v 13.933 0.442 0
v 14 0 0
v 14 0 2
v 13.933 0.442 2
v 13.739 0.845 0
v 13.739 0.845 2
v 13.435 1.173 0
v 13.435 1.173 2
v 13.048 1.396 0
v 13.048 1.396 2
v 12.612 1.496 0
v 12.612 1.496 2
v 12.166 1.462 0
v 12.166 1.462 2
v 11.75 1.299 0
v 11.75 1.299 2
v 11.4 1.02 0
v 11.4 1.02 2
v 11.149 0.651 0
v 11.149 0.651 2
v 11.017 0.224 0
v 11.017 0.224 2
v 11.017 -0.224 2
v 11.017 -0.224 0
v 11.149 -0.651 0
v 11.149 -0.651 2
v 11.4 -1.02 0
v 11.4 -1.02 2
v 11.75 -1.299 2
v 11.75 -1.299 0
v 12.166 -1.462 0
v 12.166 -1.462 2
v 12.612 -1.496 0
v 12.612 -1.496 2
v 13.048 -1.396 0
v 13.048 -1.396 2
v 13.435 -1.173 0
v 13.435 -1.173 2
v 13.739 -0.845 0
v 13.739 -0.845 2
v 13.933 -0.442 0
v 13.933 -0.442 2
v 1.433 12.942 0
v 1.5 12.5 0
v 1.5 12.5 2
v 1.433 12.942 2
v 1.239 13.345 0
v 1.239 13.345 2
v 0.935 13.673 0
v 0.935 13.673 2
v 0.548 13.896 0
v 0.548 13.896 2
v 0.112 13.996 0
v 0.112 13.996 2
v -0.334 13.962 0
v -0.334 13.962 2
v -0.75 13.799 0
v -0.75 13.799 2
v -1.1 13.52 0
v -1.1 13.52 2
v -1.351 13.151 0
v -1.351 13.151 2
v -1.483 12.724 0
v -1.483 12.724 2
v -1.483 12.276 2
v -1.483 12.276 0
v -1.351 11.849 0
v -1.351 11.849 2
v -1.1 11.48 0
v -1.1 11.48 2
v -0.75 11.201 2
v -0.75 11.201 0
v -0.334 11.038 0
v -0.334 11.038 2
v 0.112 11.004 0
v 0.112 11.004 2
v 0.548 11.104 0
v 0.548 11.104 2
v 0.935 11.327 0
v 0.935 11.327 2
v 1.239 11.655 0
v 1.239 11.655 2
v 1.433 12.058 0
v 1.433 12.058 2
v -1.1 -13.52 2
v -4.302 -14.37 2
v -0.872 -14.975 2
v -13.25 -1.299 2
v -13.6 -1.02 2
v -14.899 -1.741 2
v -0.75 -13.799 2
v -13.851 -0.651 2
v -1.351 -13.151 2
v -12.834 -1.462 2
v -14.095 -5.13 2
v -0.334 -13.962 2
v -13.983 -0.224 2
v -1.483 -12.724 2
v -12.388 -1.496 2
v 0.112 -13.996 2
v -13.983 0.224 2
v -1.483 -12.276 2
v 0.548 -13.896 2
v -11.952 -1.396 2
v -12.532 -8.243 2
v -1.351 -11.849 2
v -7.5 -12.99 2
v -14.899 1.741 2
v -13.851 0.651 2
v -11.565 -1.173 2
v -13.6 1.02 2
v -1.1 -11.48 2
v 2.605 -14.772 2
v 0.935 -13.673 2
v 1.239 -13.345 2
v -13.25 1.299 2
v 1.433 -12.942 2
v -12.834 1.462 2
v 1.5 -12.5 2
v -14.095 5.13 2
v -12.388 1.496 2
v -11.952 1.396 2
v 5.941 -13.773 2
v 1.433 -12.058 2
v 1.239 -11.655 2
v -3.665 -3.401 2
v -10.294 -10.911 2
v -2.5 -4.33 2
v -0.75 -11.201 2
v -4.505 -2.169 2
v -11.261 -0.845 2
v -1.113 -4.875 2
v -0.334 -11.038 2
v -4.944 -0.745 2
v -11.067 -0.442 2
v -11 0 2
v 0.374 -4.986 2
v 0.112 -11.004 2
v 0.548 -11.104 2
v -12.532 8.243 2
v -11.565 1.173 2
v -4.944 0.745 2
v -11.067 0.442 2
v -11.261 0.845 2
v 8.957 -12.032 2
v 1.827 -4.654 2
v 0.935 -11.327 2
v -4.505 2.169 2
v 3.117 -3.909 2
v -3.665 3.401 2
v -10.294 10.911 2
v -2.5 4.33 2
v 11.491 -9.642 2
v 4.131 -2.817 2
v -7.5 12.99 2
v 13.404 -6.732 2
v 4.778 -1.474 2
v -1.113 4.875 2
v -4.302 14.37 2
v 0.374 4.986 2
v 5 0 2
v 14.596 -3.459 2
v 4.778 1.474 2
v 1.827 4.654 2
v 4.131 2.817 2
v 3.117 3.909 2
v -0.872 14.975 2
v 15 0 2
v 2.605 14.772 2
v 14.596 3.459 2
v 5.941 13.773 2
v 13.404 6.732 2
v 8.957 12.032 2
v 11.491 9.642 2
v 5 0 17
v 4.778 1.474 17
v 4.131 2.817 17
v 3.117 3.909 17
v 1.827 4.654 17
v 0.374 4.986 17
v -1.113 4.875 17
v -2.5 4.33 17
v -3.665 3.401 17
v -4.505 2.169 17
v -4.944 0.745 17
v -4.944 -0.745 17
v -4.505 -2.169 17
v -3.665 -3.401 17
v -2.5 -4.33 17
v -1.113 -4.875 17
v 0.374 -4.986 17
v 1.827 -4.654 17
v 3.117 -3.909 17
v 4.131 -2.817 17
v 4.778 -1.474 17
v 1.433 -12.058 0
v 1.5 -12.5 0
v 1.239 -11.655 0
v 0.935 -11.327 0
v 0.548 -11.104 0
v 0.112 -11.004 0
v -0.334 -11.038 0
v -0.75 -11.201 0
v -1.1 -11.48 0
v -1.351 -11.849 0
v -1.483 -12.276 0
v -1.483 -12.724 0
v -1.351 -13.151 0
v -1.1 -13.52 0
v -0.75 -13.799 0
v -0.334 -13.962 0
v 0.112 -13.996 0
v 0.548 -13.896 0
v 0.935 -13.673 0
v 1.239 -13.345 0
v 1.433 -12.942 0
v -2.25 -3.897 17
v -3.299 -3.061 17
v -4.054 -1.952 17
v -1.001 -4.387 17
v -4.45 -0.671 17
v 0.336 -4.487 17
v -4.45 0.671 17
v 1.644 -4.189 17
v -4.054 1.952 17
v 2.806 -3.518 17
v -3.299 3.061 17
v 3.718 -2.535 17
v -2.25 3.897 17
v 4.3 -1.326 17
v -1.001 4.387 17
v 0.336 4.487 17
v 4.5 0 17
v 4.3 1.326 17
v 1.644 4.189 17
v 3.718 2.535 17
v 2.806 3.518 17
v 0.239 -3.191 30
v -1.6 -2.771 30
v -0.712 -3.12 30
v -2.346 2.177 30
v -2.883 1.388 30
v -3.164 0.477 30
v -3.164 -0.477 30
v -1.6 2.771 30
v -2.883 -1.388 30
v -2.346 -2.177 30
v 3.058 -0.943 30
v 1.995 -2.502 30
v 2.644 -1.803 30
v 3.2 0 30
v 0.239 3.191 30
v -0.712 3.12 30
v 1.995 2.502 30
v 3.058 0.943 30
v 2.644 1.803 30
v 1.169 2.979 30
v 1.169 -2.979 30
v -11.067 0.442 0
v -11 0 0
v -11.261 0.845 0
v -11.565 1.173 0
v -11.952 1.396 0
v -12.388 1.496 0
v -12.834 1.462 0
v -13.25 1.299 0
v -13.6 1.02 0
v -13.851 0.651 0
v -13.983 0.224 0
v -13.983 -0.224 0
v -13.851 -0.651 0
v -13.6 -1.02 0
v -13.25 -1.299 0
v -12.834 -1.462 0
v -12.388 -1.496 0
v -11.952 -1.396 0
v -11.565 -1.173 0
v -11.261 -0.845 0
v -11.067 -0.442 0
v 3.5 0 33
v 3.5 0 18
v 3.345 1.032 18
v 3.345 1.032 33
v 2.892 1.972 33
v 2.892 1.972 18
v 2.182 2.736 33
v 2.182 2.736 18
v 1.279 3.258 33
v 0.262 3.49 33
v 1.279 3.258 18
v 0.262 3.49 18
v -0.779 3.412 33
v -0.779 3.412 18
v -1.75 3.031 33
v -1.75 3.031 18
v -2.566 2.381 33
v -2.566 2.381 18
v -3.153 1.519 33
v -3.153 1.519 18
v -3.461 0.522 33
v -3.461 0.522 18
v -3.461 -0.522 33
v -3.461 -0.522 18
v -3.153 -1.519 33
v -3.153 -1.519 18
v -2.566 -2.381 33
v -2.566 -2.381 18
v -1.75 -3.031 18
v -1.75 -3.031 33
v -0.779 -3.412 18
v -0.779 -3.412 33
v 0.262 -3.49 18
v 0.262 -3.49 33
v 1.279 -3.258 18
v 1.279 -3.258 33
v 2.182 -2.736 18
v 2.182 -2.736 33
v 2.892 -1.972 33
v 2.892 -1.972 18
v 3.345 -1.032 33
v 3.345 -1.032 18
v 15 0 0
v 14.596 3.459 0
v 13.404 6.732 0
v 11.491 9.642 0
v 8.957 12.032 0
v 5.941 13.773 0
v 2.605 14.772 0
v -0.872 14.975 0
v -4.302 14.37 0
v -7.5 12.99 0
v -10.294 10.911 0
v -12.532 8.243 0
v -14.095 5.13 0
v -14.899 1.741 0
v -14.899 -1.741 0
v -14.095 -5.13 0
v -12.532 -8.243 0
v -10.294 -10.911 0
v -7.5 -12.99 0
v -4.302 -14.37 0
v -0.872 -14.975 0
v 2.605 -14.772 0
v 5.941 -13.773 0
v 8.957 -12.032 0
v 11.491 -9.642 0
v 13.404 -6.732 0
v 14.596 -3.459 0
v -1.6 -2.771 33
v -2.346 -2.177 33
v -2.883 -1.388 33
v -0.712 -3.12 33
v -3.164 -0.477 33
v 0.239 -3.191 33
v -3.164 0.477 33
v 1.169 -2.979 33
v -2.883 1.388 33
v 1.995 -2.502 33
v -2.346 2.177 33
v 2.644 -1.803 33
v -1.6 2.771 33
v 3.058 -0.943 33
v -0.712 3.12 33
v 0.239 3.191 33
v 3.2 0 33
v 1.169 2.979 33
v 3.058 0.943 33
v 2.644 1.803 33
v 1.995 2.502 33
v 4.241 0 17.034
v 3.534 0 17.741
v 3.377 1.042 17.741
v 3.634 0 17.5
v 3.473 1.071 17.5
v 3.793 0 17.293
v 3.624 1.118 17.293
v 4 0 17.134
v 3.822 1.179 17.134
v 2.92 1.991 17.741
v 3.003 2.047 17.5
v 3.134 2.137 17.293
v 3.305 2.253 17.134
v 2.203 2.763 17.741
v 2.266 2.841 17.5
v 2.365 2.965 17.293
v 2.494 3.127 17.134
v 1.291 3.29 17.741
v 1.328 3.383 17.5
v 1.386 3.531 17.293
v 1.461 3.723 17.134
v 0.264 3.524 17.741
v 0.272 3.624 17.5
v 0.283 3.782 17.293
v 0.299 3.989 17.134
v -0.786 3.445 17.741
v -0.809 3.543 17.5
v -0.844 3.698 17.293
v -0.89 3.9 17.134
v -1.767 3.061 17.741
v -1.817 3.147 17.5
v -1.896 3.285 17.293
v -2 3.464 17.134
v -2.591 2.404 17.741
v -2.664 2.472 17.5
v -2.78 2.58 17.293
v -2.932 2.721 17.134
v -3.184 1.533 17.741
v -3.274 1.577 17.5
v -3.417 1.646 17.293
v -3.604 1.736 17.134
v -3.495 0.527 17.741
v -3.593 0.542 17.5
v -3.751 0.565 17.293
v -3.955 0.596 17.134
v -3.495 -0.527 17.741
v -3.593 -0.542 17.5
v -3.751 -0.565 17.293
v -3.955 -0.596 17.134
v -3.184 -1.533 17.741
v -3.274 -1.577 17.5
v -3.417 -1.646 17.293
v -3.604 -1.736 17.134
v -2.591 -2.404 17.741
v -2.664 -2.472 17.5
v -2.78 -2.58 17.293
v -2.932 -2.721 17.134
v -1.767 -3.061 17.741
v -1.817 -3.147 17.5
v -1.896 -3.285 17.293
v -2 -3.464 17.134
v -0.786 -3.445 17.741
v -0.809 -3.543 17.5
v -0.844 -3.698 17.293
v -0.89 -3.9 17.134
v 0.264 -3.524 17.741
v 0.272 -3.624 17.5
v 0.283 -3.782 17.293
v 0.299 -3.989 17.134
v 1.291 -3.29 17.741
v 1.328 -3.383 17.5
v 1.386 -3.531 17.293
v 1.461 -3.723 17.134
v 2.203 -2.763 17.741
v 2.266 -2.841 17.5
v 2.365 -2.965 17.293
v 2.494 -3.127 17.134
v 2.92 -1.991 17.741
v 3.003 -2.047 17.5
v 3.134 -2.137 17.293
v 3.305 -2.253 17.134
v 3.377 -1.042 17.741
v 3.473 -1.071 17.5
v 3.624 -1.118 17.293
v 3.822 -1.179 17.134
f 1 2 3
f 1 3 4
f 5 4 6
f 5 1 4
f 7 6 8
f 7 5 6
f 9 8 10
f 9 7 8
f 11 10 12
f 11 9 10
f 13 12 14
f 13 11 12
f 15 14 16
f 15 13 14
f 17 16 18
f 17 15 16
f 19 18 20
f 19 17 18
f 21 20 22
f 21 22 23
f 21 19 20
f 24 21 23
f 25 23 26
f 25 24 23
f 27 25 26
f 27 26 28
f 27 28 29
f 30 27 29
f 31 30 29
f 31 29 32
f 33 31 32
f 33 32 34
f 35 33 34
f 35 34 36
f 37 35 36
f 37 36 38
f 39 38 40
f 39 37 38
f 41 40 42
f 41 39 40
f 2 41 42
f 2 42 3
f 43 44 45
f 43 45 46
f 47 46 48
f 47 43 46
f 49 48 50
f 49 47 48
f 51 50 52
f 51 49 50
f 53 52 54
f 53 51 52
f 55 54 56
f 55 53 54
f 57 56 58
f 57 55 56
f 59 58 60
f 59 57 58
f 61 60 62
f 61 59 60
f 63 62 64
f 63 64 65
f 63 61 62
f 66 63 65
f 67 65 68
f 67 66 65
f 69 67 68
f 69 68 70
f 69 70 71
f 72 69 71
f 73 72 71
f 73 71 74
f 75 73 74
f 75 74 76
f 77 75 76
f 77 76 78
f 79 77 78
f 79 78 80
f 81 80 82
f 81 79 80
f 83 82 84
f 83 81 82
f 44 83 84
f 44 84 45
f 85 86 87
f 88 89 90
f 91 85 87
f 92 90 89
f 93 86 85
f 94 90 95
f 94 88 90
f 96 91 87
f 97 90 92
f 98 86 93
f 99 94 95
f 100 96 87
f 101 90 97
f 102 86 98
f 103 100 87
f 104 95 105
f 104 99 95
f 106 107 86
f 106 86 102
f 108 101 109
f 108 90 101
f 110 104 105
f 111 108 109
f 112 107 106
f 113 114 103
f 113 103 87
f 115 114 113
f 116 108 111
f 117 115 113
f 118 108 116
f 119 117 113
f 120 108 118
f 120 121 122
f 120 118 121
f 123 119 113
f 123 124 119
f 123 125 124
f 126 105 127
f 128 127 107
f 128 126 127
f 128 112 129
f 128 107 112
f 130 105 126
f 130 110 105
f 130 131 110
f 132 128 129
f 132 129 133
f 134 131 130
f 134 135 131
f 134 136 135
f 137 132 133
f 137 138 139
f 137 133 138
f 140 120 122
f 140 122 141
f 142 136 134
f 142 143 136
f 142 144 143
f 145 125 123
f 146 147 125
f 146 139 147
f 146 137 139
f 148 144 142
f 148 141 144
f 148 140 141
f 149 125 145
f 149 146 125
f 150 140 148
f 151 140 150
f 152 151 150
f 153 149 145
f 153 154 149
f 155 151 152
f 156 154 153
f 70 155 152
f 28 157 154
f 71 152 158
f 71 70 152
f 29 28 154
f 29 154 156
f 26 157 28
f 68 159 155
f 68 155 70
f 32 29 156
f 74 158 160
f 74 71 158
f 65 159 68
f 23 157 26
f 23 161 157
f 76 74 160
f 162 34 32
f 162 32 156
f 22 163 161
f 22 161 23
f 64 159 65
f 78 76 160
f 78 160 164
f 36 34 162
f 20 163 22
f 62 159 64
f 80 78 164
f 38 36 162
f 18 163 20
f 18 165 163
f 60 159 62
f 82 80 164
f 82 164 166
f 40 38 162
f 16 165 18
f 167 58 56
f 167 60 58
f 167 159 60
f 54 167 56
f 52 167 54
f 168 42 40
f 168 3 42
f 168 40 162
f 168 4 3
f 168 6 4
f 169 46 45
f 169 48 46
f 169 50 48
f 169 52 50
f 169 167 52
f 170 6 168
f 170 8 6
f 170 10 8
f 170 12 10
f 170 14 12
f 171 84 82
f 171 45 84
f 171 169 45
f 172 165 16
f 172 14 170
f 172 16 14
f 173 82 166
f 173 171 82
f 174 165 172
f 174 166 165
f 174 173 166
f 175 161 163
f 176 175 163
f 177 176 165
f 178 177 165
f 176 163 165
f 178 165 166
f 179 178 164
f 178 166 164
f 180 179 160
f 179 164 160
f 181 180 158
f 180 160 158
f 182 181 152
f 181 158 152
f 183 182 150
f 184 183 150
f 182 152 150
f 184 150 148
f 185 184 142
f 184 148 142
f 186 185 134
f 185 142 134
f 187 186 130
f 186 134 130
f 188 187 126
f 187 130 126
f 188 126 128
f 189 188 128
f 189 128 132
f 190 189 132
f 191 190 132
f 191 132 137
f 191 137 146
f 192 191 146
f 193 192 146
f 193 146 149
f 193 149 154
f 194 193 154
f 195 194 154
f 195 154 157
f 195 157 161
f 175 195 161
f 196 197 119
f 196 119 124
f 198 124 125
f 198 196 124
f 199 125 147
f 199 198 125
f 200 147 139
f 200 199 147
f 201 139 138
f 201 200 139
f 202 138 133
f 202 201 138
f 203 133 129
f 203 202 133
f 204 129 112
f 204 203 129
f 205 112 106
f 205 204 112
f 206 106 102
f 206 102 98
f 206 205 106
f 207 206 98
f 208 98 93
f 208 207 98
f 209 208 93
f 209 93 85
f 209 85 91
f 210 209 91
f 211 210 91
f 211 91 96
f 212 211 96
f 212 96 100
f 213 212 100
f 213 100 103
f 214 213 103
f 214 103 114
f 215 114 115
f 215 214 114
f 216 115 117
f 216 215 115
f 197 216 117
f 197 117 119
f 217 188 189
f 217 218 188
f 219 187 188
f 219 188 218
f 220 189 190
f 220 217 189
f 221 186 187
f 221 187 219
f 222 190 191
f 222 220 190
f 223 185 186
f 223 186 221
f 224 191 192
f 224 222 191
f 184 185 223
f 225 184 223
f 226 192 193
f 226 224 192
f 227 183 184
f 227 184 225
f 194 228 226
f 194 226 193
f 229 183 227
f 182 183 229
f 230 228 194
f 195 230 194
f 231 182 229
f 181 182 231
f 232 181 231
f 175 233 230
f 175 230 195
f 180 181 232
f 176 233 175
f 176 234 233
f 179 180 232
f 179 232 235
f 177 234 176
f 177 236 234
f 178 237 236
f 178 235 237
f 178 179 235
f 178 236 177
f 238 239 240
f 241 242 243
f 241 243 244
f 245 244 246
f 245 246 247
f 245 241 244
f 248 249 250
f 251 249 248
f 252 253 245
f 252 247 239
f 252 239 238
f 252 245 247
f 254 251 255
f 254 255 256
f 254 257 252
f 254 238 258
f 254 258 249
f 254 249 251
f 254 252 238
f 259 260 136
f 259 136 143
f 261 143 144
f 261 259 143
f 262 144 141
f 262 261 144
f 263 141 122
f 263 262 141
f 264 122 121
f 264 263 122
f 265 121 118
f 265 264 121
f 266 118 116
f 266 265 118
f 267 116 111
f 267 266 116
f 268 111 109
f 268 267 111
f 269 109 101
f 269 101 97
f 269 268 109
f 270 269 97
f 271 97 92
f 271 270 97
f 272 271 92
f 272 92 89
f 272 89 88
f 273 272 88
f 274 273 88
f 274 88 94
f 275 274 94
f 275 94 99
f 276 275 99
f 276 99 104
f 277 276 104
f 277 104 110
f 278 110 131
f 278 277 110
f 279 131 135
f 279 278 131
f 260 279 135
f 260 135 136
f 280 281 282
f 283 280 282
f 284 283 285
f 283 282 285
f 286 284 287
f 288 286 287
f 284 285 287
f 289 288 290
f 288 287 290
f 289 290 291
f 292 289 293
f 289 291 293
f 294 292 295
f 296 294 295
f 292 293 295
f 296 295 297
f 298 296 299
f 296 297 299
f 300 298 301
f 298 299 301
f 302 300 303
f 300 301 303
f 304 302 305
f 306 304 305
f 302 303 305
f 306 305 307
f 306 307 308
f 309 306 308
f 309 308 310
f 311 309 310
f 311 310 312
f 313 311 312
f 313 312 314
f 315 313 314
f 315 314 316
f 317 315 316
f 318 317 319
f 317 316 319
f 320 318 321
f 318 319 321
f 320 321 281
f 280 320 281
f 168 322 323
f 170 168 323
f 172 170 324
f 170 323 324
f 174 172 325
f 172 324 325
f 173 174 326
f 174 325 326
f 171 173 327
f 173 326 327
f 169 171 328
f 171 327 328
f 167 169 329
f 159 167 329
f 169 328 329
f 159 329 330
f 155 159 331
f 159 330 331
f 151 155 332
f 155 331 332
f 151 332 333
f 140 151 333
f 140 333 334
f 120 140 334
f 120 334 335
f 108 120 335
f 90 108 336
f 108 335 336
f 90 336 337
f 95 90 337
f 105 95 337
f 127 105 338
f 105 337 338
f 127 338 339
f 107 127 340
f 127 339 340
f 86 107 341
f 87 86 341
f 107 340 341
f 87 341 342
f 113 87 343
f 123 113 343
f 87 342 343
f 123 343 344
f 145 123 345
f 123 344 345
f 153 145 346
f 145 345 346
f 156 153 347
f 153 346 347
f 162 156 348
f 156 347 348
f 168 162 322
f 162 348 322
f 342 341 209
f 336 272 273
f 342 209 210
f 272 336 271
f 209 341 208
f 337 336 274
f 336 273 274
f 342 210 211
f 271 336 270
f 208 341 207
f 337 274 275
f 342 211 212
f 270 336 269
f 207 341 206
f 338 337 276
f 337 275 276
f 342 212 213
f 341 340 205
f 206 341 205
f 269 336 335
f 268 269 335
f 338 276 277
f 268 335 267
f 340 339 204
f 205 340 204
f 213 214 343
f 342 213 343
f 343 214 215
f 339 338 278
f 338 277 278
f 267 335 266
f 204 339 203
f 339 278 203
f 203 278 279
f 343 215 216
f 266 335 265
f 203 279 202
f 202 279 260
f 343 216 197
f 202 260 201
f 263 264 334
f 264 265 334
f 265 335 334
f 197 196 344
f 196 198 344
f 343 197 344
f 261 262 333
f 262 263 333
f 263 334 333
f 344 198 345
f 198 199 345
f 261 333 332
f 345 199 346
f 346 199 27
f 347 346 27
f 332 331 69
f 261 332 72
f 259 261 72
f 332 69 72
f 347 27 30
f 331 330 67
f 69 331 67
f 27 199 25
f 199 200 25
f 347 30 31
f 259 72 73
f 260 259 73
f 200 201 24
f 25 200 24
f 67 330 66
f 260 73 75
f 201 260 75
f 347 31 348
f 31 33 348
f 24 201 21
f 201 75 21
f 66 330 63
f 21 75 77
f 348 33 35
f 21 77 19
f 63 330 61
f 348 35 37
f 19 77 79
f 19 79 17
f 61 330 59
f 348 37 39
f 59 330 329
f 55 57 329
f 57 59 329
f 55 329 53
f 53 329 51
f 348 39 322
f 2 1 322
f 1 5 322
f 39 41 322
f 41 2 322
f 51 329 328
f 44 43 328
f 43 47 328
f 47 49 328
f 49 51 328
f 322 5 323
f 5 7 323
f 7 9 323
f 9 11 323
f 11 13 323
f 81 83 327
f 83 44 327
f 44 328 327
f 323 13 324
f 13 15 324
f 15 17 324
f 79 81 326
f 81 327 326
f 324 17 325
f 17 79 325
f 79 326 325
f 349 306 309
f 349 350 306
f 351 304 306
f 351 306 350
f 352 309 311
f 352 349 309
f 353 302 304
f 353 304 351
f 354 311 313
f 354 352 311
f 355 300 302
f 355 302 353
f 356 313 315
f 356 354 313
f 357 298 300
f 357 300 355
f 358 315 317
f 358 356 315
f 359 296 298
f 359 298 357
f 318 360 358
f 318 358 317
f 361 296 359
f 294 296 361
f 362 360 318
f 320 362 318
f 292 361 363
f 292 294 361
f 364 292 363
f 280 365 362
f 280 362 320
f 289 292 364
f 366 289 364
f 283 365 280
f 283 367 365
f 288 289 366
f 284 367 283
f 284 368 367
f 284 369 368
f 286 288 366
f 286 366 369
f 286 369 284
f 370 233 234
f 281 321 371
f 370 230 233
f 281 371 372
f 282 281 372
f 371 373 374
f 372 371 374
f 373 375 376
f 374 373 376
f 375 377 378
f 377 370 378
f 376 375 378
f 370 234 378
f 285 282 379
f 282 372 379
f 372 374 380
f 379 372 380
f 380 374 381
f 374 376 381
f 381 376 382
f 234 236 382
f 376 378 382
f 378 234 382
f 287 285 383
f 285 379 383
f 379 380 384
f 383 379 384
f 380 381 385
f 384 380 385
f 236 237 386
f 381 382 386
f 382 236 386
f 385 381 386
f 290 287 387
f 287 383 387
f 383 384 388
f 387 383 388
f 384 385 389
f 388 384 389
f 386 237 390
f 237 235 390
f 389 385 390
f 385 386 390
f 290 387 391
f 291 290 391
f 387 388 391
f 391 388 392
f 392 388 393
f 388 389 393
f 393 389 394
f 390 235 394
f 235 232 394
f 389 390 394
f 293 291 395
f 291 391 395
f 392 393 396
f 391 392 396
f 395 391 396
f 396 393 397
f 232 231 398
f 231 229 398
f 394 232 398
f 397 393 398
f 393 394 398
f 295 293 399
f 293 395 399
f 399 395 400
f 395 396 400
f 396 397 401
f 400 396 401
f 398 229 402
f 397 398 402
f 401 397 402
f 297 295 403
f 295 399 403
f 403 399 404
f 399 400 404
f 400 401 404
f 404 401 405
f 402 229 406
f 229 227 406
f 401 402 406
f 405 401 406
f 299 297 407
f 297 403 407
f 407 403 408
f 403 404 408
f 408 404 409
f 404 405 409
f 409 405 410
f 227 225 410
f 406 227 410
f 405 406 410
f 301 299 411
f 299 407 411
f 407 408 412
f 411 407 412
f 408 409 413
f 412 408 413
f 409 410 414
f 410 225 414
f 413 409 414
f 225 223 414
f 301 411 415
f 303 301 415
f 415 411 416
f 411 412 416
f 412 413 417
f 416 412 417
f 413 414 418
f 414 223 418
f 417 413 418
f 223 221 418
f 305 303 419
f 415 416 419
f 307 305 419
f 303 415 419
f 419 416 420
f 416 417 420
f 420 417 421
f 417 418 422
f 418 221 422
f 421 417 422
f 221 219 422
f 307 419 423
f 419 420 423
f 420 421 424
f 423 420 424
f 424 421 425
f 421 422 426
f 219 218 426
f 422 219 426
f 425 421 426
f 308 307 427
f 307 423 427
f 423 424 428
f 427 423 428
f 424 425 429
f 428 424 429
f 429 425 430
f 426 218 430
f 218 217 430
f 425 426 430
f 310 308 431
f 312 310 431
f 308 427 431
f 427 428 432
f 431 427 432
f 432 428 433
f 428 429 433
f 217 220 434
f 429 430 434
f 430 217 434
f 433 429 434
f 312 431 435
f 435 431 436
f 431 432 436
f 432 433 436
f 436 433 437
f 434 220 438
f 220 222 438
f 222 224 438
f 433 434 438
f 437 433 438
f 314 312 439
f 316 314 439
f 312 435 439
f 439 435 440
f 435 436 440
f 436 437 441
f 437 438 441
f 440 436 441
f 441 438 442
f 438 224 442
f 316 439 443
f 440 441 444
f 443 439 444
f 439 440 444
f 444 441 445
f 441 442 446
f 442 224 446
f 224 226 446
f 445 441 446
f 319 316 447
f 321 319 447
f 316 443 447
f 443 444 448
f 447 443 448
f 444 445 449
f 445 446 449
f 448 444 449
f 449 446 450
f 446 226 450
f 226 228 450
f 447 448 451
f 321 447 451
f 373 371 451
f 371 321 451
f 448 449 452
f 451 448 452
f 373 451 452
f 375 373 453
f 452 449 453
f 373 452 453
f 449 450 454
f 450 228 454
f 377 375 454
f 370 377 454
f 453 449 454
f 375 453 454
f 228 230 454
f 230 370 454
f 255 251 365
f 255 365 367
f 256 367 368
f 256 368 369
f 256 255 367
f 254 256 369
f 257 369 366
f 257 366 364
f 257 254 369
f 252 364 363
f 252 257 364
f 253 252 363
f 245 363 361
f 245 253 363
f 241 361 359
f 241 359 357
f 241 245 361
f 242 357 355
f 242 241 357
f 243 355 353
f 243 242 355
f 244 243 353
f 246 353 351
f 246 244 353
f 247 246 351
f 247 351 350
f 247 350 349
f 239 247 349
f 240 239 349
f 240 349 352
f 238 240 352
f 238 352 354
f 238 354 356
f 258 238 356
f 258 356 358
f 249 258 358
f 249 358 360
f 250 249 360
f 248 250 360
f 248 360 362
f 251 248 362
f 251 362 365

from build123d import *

# Parameters (mm, degrees)
SKETCH1_R           = 15
SKETCH1_R_2         = 1.5
SKETCH1_R_3         = 5
BOSS_EXTRUDE1_DEPTH = 2
SKETCH1_3_R         = 5
SKETCH1_3_R_2       = 3.5
SKETCH1_3_R_3       = 3.2
BOSS_EXTRUDE2_DEPTH = 17
BOSS_EXTRUDE3_START = 17
SKETCH1_4_R         = 3.5
SKETCH1_4_R_2       = 3.2
BOSS_EXTRUDE3_DEPTH = 16
SKETCH2_R           = 3.2
BOSS_EXTRUDE4_DEPTH = 13
FILLET1_R           = 1


with BuildPart() as part:
    # Sketch1 → Boss-Extrude1 (new body)
    with BuildSketch(Plane.XY):
        Circle(SKETCH1_R)
        with Locations((0, 12.5)):
            Circle(SKETCH1_R_2, mode=Mode.SUBTRACT)
        with Locations((12.5, 0)):
            Circle(SKETCH1_R_2, mode=Mode.SUBTRACT)
        with Locations((0, -12.5)):
            Circle(SKETCH1_R_2, mode=Mode.SUBTRACT)
        with Locations((-12.5, 0)):
            Circle(SKETCH1_R_2, mode=Mode.SUBTRACT)
        Circle(SKETCH1_R_3, mode=Mode.SUBTRACT)
    extrude(amount=BOSS_EXTRUDE1_DEPTH)

    # Sketch1<3> → Boss-Extrude2 (add)
    # profile 1 of 3: a face of its own
    with BuildSketch(Plane.XY):
        Circle(SKETCH1_3_R)
        Circle(SKETCH1_3_R_2, mode=Mode.SUBTRACT)
    # profile 2 of 3: a face of its own
    with BuildSketch(Plane.XY):
        Circle(SKETCH1_3_R_2)
        Circle(SKETCH1_3_R_3, mode=Mode.SUBTRACT)
    # profile 3 of 3: a face of its own
    with BuildSketch(Plane.XY):
        Circle(SKETCH1_3_R_3)
    extrude(amount=BOSS_EXTRUDE2_DEPTH)

    # Sketch1<4> → Boss-Extrude3 (add)
    with BuildSketch(Plane.XY.offset(BOSS_EXTRUDE3_START)):
        Circle(SKETCH1_4_R)
        Circle(SKETCH1_4_R_2, mode=Mode.SUBTRACT)
    extrude(amount=BOSS_EXTRUDE3_DEPTH)

    # Sketch2 → Boss-Extrude4 (add)
    with BuildSketch(Plane.XY.offset(17)):
        Circle(SKETCH2_R)
    extrude(amount=BOSS_EXTRUDE4_DEPTH)

    # Fillet1
    fillet1_edges = [part.edges().sort_by_distance(p)[0] for p in [
        (-3.5, 0, 17),
    ]]
    fillet(fillet1_edges, radius=FILLET1_R)


solid = part.part
